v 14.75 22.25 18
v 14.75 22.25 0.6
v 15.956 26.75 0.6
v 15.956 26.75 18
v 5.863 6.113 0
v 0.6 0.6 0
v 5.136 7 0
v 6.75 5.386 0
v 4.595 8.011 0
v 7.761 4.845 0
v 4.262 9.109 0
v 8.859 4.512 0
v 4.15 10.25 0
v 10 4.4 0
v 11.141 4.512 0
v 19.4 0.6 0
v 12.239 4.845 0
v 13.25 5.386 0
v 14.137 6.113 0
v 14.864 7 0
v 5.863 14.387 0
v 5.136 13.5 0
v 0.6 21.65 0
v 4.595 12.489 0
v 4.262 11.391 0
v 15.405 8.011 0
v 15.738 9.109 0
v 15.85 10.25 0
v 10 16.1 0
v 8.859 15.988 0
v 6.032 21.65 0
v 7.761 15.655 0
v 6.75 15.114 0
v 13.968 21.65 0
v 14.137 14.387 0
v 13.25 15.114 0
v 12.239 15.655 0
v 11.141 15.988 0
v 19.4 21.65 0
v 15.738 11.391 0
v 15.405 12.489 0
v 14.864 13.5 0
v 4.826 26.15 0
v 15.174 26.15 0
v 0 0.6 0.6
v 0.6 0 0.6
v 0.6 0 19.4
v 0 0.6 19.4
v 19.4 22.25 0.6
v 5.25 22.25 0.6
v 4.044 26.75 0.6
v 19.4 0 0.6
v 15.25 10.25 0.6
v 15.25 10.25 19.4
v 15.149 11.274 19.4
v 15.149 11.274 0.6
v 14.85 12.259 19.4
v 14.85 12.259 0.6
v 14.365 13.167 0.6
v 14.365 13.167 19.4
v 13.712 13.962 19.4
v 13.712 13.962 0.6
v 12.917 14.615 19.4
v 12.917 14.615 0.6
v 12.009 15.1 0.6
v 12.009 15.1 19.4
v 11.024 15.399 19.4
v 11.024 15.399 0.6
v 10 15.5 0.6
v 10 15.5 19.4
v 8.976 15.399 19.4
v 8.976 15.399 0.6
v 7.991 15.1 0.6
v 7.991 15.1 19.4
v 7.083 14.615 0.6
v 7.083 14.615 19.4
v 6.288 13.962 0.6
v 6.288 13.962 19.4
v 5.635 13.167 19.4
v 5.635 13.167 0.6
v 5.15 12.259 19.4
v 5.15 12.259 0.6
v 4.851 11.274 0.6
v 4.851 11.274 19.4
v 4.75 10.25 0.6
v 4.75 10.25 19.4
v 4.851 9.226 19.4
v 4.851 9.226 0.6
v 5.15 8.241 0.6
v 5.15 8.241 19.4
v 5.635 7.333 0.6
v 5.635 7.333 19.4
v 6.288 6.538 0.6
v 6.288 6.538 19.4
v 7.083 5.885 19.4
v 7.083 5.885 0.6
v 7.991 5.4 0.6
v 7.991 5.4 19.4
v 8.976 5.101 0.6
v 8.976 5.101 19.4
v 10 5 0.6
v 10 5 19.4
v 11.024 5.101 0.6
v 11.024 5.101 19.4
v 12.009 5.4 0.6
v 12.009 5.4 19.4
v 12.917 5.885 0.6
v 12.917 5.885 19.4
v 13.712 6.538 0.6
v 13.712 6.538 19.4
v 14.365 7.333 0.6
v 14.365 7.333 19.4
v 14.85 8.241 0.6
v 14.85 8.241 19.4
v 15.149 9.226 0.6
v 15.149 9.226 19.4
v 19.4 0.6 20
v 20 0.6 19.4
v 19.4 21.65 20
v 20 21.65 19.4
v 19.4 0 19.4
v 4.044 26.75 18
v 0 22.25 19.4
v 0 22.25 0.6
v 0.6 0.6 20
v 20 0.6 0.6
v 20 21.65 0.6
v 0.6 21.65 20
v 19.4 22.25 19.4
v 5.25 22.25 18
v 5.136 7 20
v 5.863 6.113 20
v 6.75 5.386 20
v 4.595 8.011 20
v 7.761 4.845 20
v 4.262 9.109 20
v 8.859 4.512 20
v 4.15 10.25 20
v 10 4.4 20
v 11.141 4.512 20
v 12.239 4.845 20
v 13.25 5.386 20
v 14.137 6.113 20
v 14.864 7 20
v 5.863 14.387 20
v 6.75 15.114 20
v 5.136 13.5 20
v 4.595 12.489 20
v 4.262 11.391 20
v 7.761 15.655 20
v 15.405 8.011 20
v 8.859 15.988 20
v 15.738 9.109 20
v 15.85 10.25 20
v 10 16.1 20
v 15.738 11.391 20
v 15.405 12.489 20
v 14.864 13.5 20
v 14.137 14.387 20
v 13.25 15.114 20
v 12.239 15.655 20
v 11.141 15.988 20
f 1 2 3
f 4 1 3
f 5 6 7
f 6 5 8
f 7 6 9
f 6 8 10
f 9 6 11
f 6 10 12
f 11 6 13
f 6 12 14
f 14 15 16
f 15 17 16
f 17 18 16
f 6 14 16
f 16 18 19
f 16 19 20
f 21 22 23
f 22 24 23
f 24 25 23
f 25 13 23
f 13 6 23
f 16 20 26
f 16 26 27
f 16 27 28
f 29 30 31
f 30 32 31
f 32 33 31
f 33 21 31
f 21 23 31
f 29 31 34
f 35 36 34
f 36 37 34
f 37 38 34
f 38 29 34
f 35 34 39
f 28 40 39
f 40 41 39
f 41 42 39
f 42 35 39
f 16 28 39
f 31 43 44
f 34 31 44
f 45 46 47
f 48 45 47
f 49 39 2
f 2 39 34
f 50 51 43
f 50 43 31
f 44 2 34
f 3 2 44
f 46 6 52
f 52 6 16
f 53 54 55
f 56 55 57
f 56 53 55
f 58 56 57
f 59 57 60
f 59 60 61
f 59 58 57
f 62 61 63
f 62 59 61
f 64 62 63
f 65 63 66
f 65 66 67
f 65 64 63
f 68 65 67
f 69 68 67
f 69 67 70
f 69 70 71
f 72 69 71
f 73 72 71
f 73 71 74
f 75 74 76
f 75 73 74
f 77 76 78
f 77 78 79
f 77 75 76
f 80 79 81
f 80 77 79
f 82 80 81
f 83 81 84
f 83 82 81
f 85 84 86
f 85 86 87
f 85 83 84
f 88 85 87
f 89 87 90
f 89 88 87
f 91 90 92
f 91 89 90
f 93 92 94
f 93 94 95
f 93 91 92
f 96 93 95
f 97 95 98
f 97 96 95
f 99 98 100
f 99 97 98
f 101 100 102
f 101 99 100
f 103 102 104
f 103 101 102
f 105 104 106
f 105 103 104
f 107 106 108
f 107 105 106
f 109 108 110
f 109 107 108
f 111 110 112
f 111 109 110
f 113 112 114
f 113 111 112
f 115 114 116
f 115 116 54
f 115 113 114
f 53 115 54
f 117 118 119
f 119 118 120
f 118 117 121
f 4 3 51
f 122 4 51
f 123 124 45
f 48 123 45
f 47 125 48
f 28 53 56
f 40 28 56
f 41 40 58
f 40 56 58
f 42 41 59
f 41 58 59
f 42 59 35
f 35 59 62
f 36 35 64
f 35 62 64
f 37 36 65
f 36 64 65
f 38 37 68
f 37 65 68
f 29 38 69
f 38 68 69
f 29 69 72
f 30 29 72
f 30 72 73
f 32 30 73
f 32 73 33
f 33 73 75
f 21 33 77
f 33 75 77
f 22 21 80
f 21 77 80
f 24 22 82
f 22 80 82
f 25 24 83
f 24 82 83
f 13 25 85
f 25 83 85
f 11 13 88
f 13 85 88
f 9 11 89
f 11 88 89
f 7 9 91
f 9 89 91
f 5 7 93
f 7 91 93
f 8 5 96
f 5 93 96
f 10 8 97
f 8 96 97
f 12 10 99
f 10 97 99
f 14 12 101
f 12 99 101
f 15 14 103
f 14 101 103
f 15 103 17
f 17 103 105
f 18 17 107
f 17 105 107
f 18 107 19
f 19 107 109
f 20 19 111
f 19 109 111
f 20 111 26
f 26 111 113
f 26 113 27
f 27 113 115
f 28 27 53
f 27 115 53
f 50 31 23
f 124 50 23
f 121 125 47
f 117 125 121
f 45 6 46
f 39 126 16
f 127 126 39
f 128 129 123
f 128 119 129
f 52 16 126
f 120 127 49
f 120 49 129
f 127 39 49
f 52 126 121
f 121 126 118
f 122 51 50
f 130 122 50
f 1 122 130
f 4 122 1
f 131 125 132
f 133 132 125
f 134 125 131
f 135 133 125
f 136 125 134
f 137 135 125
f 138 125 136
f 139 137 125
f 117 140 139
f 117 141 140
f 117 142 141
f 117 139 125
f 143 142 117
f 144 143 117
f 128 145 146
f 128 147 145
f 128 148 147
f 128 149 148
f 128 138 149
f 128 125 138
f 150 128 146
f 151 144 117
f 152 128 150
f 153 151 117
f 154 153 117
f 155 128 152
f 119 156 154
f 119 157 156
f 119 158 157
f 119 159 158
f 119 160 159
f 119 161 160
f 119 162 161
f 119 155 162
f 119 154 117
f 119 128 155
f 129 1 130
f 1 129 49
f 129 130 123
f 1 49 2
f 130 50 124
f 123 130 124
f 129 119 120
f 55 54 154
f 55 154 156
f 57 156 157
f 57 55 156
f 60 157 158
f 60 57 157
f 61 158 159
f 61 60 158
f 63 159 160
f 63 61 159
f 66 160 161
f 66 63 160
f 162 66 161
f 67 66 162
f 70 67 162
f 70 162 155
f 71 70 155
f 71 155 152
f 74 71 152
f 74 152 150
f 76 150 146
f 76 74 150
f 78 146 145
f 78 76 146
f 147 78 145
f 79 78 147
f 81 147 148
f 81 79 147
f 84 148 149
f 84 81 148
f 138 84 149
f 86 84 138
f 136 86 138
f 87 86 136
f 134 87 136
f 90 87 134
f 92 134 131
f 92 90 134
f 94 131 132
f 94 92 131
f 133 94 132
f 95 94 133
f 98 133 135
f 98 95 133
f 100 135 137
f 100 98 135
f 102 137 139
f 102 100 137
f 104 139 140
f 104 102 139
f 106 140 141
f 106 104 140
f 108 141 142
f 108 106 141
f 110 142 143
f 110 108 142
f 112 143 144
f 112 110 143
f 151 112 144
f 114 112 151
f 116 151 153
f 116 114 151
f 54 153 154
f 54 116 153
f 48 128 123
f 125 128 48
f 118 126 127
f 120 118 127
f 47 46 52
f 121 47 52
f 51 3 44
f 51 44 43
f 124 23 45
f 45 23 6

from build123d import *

# Parameters (mm, degrees)
F2_R     = 5.25
F3_DEPTH = 20
F4_DEPTH = 18
F5_SIZE  = 0.6


# Not quite as in the source:
# - a feature names something its author has since deleted; it is built from what else it names


with BuildPart() as f3:
    # F2 (on Top) → F3 (new body)
    with BuildSketch(Plane.XY):
        Polygon((5.25, 22.25), (0, 22.25), (0, 0), (20, 0), (20, 22.25), (14.75, 22.25), align=None)
        with Locations((10, 10.25)):
            Circle(F2_R, mode=Mode.SUBTRACT)
    extrude(amount=F3_DEPTH)

    # F2 (on Top) → F4 (join)
    with BuildSketch(Plane.XY):
        Polygon((4.0442286341, 26.75), (5.25, 22.25), (14.75, 22.25), (15.9557713659, 26.75), align=None)
    extrude(amount=F4_DEPTH)

    # F5
    f5_edges = [f3.edges().sort_by_distance(p)[0] for p in [
        (0, 11.125, 0),
        (10, 0, 0),
        (20, 11.125, 0),
        (17.375, 22.25, 0),
        (15.352886, 24.5, 0),
        (10, 26.75, 0),
        (4.647114, 24.5, 0),
        (2.625, 22.25, 0),
        (4.75, 10.25, 0),
        (10, 22.25, 20),
        (0, 11.125, 20),
        (10, 0, 20),
        (20, 11.125, 20),
        (4.75, 10.25, 20),
        (0, 0, 10),
        (20, 0, 10),
        (20, 22.25, 10),
    ]]
    chamfer(f5_edges, length=F5_SIZE)


solid = f3.part
